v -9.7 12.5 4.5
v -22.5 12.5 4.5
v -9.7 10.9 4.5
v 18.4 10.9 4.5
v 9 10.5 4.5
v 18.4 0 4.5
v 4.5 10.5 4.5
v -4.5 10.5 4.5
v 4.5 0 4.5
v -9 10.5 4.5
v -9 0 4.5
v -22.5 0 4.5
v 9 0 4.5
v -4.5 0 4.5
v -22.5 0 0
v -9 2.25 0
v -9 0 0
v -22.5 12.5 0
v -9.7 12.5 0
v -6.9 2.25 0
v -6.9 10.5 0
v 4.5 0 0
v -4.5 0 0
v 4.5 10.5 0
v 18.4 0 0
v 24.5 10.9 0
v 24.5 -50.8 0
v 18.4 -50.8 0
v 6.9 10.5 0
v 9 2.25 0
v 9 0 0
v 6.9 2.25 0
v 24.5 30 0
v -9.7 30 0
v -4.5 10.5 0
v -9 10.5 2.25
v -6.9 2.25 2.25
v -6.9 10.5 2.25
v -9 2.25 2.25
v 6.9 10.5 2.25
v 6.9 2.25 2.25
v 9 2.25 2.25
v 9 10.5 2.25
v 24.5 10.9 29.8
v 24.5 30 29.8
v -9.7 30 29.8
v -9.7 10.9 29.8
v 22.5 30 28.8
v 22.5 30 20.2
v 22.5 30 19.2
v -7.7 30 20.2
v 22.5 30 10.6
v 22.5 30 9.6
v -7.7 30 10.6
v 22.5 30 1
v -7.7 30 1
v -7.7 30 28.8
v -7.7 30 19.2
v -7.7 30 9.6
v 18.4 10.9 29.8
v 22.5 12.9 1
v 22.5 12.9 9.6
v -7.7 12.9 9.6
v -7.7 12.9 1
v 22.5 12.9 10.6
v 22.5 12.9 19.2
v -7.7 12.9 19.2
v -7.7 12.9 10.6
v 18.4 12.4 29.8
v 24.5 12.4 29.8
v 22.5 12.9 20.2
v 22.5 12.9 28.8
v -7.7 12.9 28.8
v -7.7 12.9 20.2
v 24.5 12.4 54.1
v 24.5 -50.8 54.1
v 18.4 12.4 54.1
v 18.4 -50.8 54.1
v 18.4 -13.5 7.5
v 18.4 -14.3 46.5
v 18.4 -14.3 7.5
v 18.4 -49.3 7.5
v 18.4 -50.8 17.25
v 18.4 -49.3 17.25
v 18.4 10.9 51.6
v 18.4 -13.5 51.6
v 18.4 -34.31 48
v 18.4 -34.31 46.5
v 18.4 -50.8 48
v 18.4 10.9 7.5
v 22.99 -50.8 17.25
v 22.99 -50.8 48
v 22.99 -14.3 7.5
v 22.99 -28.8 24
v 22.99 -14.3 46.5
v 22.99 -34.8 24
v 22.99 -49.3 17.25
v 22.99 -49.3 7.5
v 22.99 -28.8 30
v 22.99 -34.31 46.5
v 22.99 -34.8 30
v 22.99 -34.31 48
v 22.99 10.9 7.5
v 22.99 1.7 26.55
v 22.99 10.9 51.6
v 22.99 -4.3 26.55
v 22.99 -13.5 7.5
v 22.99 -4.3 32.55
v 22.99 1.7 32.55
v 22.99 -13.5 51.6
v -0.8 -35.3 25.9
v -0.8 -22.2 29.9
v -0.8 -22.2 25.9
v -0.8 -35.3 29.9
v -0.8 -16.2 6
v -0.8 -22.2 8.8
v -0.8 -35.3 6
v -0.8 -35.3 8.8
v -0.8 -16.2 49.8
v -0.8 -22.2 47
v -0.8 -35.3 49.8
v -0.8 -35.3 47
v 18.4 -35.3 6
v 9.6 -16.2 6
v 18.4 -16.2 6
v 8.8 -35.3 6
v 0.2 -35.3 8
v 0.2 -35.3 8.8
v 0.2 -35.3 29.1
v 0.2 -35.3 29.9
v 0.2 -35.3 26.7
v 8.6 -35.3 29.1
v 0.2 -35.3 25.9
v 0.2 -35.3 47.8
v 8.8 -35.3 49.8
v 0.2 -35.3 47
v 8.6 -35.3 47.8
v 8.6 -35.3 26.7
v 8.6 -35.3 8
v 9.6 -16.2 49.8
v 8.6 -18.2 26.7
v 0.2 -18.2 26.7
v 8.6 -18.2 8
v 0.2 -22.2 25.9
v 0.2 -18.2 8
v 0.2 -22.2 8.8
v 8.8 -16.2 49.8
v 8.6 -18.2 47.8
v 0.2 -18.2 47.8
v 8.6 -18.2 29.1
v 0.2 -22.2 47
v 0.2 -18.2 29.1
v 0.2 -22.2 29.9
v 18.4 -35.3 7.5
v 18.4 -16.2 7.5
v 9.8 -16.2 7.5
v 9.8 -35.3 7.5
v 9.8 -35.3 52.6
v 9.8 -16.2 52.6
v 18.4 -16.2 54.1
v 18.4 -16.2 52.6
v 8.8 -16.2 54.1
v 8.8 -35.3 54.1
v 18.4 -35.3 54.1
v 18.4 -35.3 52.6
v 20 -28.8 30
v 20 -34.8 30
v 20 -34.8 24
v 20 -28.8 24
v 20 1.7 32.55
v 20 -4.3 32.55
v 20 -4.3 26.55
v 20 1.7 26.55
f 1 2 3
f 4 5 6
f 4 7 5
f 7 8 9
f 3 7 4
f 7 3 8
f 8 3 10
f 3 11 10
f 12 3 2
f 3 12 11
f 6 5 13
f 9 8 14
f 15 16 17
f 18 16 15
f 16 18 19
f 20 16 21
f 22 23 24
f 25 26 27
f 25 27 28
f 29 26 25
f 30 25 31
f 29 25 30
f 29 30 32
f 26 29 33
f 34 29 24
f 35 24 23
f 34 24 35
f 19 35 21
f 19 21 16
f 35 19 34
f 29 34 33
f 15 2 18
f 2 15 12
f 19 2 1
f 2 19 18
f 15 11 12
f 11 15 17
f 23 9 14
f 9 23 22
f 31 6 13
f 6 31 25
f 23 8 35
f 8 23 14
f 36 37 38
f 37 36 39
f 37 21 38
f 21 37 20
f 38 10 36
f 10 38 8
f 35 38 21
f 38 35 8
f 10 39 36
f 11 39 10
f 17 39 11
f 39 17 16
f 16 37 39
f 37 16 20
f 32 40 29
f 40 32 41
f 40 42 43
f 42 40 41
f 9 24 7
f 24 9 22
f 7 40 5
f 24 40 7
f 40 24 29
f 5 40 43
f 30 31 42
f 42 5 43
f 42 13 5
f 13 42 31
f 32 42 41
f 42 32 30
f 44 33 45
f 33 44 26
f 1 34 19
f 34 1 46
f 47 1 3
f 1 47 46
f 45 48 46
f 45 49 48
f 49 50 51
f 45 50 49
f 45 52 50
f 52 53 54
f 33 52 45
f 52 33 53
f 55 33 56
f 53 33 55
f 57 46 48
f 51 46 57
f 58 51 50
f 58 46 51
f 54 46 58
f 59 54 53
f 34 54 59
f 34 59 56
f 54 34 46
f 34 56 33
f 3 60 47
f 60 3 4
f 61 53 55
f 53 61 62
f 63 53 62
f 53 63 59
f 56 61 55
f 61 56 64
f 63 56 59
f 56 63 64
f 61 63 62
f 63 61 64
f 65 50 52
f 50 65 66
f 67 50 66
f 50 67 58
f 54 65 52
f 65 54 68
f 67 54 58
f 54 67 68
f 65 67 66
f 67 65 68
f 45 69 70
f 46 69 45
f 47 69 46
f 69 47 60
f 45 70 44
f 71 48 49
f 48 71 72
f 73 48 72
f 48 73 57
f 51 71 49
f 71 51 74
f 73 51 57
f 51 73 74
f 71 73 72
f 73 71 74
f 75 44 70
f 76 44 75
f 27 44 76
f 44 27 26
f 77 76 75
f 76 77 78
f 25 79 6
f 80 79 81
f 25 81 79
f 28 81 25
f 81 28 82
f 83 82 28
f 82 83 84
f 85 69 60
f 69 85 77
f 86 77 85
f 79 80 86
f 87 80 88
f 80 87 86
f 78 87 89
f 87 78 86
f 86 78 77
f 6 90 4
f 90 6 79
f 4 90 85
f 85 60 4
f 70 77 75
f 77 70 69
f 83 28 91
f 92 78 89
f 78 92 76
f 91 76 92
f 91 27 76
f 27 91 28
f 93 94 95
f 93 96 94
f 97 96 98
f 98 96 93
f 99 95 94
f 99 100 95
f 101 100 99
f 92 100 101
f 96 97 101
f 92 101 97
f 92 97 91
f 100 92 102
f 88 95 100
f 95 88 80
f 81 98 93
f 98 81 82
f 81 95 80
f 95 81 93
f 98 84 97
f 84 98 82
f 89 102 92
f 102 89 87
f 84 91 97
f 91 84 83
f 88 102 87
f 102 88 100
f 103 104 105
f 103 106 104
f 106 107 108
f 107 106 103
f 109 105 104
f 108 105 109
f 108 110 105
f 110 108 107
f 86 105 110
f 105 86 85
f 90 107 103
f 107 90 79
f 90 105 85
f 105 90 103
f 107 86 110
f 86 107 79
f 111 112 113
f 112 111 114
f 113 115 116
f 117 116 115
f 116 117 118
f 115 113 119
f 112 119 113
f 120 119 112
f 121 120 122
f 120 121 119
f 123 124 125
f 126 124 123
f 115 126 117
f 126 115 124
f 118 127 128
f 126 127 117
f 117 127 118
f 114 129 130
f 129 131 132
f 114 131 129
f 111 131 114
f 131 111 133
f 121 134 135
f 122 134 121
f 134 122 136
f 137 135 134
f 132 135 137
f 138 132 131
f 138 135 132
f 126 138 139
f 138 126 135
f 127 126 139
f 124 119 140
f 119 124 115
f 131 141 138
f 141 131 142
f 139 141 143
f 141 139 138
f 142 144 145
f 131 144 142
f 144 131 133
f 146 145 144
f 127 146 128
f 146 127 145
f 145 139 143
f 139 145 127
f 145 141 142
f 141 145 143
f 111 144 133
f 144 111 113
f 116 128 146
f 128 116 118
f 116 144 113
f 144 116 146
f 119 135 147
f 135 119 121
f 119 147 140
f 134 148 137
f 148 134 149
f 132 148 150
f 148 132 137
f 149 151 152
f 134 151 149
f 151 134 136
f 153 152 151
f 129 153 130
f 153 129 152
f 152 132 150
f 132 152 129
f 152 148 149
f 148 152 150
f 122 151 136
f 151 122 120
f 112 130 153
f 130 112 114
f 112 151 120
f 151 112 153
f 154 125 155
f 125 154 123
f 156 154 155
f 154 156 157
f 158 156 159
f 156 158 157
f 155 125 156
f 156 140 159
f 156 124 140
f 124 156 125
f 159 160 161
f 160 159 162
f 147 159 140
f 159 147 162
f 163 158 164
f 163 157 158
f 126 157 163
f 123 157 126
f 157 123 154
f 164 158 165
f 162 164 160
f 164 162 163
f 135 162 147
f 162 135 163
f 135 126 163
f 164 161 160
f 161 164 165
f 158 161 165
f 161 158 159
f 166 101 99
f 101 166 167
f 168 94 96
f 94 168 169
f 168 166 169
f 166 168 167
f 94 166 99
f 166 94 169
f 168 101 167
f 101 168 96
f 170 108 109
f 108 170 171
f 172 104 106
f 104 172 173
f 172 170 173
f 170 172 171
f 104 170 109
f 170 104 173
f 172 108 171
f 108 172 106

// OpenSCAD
// file: pcb-model-sizes.scad
pcbSmtLvSize=[65.94, 33.75];
pcbDevkitcRelaySize=[57.53, 31.88];
pcbCurrentSensorSize=[43.5, 35];
pcbCurrentSensorMiniSize=[39, 35];
pcbCurrentSensorMiniPadDepth=15;
pcbContactorPsuSize=[44.1, 24.4];
pcbContactorInterfaceRelaySize=[41.3,34.8];

pcbRelayHeight = 18.5;
pcbTallCompoent = 15;
pcbShortComponent = 6;

pcbThickness = 1.6;
solderThickness = 3;
wallThickness = 1.5;
partitionThickness = 0.8;

caseMargin = 0.2;
// file: relay-current-enclosure.scad
include <pcb-model-sizes.scad>

currentTopStands=[6, 28];
currentBottomStands = [7, 27];
relayTopStands=[9, 42];
relayBottomStands = [12, 41];
standSize = 2;

module relayCurrentCase(legHeight=5) {
    maxY = max(pcbCurrentSensorSize[1], pcbDevkitcRelaySize[1]);
    sizeX = 2 * wallThickness + partitionThickness + pcbDevkitcRelaySize[0] + pcbCurrentSensorSize[0];
    relayYOffset = (maxY - pcbDevkitcRelaySize[1]) / 2;
    difference() {
        cube([sizeX, 2 * wallThickness + maxY, wallThickness + pcbThickness + solderThickness]);
        translate([wallThickness - caseMargin, wallThickness + relayYOffset - caseMargin, wallThickness]) {
            cube([pcbDevkitcRelaySize[0] + 2 * caseMargin, pcbDevkitcRelaySize[1] + 2 * caseMargin, pcbThickness + solderThickness + 0.01]);
        }
        translate([wallThickness + pcbDevkitcRelaySize[0] + partitionThickness, wallThickness + (maxY - pcbCurrentSensorSize[1]) / 2, wallThickness]) {
            cube([pcbCurrentSensorSize[0], pcbCurrentSensorSize[1], pcbThickness + solderThickness + 0.01]);
        }
    }
    translate([wallThickness,wallThickness + relayYOffset,wallThickness]) {
        for(stand = relayBottomStands) {
            translate([stand, 0, 0]){
               cube([standSize, standSize, solderThickness]);
            }
        }
    }

    translate([wallThickness,wallThickness + relayYOffset + pcbDevkitcRelaySize[1] - standSize,wallThickness]) {
        for(stand = relayTopStands) {
            translate([stand, 0, 0]){
               cube([standSize, standSize, solderThickness]);
            }
        }
    }

    translate([wallThickness + pcbDevkitcRelaySize[0] + partitionThickness,wallThickness,wallThickness]) {
        for(stand = currentBottomStands) {
            translate([stand, 0, 0]){
               cube([standSize, standSize, solderThickness]);
            }
        }
    }

    translate([wallThickness + pcbDevkitcRelaySize[0] + partitionThickness,wallThickness + pcbCurrentSensorSize[1] - standSize,wallThickness]) {
        for(stand = currentTopStands) {
            translate([stand, 0, 0]){
               cube([standSize, standSize, solderThickness]);
            }
        }
    }

    translate([0, 0, wallThickness + pcbThickness + solderThickness - 0.01]) {
        translate([wallThickness + caseMargin, 0, 0]) {
            cube([1 * wallThickness, wallThickness, 2 * wallThickness]);
        }

        translate([sizeX - wallThickness - caseMargin - 1 * wallThickness, 0, 0]) {
            cube([1 * wallThickness, wallThickness, 2 * wallThickness]);
        }

        translate([wallThickness + caseMargin, maxY + wallThickness, 0]) {
            cube([2 * wallThickness, wallThickness, 2 * wallThickness]);
        }

        translate([sizeX - wallThickness - caseMargin - 2 * wallThickness, maxY + wallThickness, 0]) {
            cube([2 * wallThickness, wallThickness, 2 * wallThickness]);
        }
    }

    if (legHeight > 0) {
        translate([0,0,-legHeight + 0.01]) {
            cube([10 * wallThickness, 2 * wallThickness + maxY, legHeight]);
        }
        translate([sizeX - 10 * wallThickness, 0, -legHeight + 0.01]) {
            cube([10 * wallThickness, 2 * wallThickness + maxY, legHeight]);
        }
    }
}

module relayCurrentCaseTop() {
    maxY = max(pcbCurrentSensorSize[1], pcbDevkitcRelaySize[1]);
    trayHeight = wallThickness + pcbThickness + solderThickness;

    difference() {
        cube([2 * wallThickness + partitionThickness + pcbDevkitcRelaySize[0] + pcbCurrentSensorSize[0], 4 * wallThickness + maxY, wallThickness + pcbThickness + solderThickness + pcbRelayHeight + wallThickness]);
        translate([-0.01, wallThickness - caseMargin, -0.01]) {
            cube([2 * wallThickness + partitionThickness + pcbDevkitcRelaySize[0] + pcbCurrentSensorSize[0] + 0.02, 2 * wallThickness + maxY + 2 * caseMargin, wallThickness + pcbThickness + solderThickness]);
        }
        translate([wallThickness -0.01, wallThickness, wallThickness + pcbThickness + solderThickness - 0.01]) {
            cube([partitionThickness + pcbDevkitcRelaySize[0] + pcbCurrentSensorSize[0] + 0.02, 2 * wallThickness + maxY, pcbRelayHeight + 0.01]);
        }
        for(hole=[[6,6], [33, 6], [51, 6], [pcbDevkitcRelaySize[0] + partitionThickness + 15.5, 6], [pcbDevkitcRelaySize[0] + partitionThickness + 39, 6]]) {
            translate([wallThickness + hole[0] - hole[1] / 2, - 0.01, 0]) {
                cube([hole[1], wallThickness + 0.02, trayHeight + hole[1]]);
            }
        }
        for(hole=[[16,6], [46, 4], [pcbDevkitcRelaySize[0] + partitionThickness + 28.5, 6]]) {
            translate([wallThickness + hole[0] - hole[1] / 2, 3 * wallThickness + maxY - 0.01, 0]) {
                cube([hole[1], wallThickness + 0.02, trayHeight + hole[1]]);
            }
        }
    }
}

module smtLvSled() {
    maxY = max(pcbCurrentSensorSize[1], pcbDevkitcRelaySize[1]);

    offsetY = maxY + (2 * wallThickness) - (pcbSmtLvSize[1] + 2 * wallThickness);

    difference() {
        union() {
            translate([0, 0, 0]) {
                cube([pcbSmtLvSize[0] + 2 * wallThickness, pcbSmtLvSize[1] + 2 * wallThickness, wallThickness + pcbTallCompoent + pcbThickness]);
            }
        }
        translate([wallThickness, 1 * wallThickness, wallThickness]) {
            cube([pcbSmtLvSize[0], pcbSmtLvSize[1] + 0 * wallThickness + 0.01, pcbTallCompoent + pcbThickness + 0.01]);
        }

        translate([wallThickness, wallThickness, pcbTallCompoent / 2]) {
            cube([pcbSmtLvSize[0], pcbSmtLvSize[1] + wallThickness + 0.01, pcbTallCompoent / 2 + pcbThickness + wallThickness + 0.01]);
        }
    }
    translate([pcbSmtLvSize[0] / 4 - wallThickness, wallThickness, wallThickness]) {
        cube([wallThickness * 2, wallThickness * 3, pcbTallCompoent]);
    }
    translate([ 3 * pcbSmtLvSize[0] / 4 - wallThickness, wallThickness, wallThickness]) {
        cube([wallThickness * 2, wallThickness * 3, pcbTallCompoent]);
    }

    translate([pcbSmtLvSize[0] / 4 - wallThickness, wallThickness, wallThickness]) {
        cube([wallThickness * 2, wallThickness * 3, pcbTallCompoent]);
    }
    translate([ 3 * pcbSmtLvSize[0] / 4 - wallThickness, wallThickness, wallThickness]) {
        cube([wallThickness * 2, wallThickness * 3, pcbTallCompoent]);
    }

    translate([pcbSmtLvSize[0] / 4 - wallThickness, wallThickness + pcbSmtLvSize[1] - wallThickness * 1, wallThickness]) {
        #cube([wallThickness * 2, wallThickness * 2, pcbTallCompoent]);
    }

    translate([3 * pcbSmtLvSize[0] / 4 - wallThickness, wallThickness + pcbSmtLvSize[1] - wallThickness * 1, wallThickness]) {
        #cube([wallThickness * 2, wallThickness * 2, pcbTallCompoent]);
    }

    translate([0, -offsetY - 1.4, 0]) {
        cube([pcbSmtLvSize[0] + 2 * wallThickness, maxY + 4 * wallThickness + 2.8, wallThickness]);
    }

    translate([0, -offsetY - 1.4 - wallThickness, -3 * wallThickness]) {
        cube([pcbSmtLvSize[0] + 2 * wallThickness, wallThickness, 4 * wallThickness]);
    }

    translate([0, maxY + 3 * wallThickness + 1.4, -3 * wallThickness]) {
        cube([pcbSmtLvSize[0] + 2 * wallThickness, wallThickness, 4 * wallThickness]);
    }

}

relayCurrentCase();


translate([0, -wallThickness, wallThickness + pcbThickness + solderThickness + 2]) {
    relayCurrentCaseTop();
}

translate([0, 0, 15 + pcbRelayHeight + wallThickness]) {
    *smtLvSled();
}
// file: pcb-models.scad
module pcbDevkitcRelay() {
    rotate([-90, 0, 0]) {
        scale(1000) {
            import("pcb-models/access-control-devkitc-relay.stl");
        }
    }
}

module pcbDevkitcPsu() {
    rotate([-90, 0, 0]) {
        scale(1000) {
            import("pcb-models/access-control-devkitc-relay.stl");
        }
    }
}

module pcbCurrentSensor() {
    rotate([-90, 0, 0]) {
        scale(1000) {
            import("pcb-models/current-sensor-pcb.stl");
        }
    }
}

module pcbSmtLv() {
    rotate([-90, 0, 0]) {
        scale(1000) {
            import("pcb-models/access-control-smt-lv.stl");
        }
    }
}

module pcbContactorPsu() {
    rotate([-90, 0, 0]) {
        scale(1) {
            import("pcb-models/contactor-psu.stl");
        }
    }
}
// main file
fullContactorWidth=45; /*45.3*/
centerWingWidth=18;
centerInnerWingWidth=14;
centerInnerGap=9; /*8.9*/
centerOuterGap=22;
centerToPortEdge = centerOuterGap;
centerWingWall=2.25;
centerWingDepth=10.5;
centerWingSlotDepth=7;
centerToFarEdge = 19;
slotGap = 0.15;
pcbWidth=50;
pcbLength=66;
zeroOffsetToContactorCenter=-5;
pcbWallWidth=2;
pcbClearance=0.5;
pcbClearanceTop=1;
sideWidth = (fullContactorWidth - centerOuterGap) / 2 - centerWingWall;
gapWidth = fullContactorWidth / 2 - sideWidth;
verticalSupportWidth = 20;

wago221s415 = [30.2, 18.6 - 1.5, 8.6];
wago221s413 = [18.7, 18.6 - 1.5, 8.4];
wagoWallWidthH = 1;
wagoWallWidthV = 2;
wagoWireD = 6;
wagoLeaverOffset = 4;
wagoInterallWall = 0.8;

jstWireThickness = 2;
psuHeight = 3 * wagoWallWidthH + 3 * wago221s415[2];/*22.5*/

use <pcb-models.scad>
use <relay-current-enclosure.scad>
include <pcb-model-sizes.scad>

module contactorInterfaceSMT615() {

    difference() {
        translate([-fullContactorWidth / 2, 0, 0]) {
            union() {
                sideWidth = (fullContactorWidth - centerOuterGap) / 2 - centerWingWall;
                cube([fullContactorWidth, centerToFarEdge / 2 + 3, 2 * centerWingWall]);
            }
        }
        translate([-centerInnerGap / 2 - centerWingWall - slotGap, 0, 0]) {
            cube([centerWingWall + slotGap, centerWingDepth, centerWingWall]);
        }

        translate([-centerInnerGap / 2 - 2 * centerWingWall, 0, 0]) {
            cube([centerWingWall, centerWingWall, centerWingWall]);
        }

        translate([centerInnerGap / 2, 0, 0]) {
            cube([centerWingWall + slotGap, centerWingDepth, centerWingWall]);
        }

        translate([centerInnerGap / 2 + 1 * centerWingWall, 0, 0]) {
            cube([centerWingWall, centerWingWall, centerWingWall]);
        }

        translate([-centerInnerGap / 2 - (centerWingWall * 2), 0, centerWingWall]) {
            cube([2 * centerWingWall, centerWingDepth, centerWingWall]);
        }

        translate([centerInnerGap / 2 - (centerWingWall * 0), 0, centerWingWall]) {
            cube([2 * centerWingWall, centerWingDepth, centerWingWall]);
        }
    }

    halfWidthNotWago = (pcbWidth - wago221s415[0] - 2 * wagoWallWidthV)/2;

    translate([fullContactorWidth / 2 + pcbWallWidth - (wago221s415[0] + 2 * wagoWallWidthV), pcbLength / 2 + zeroOffsetToContactorCenter - (wago221s415[1] + wagoWallWidthV) + pcbWallWidth, /*centerWingWall * 2 + pcbClearance*/]){
        wagoPort415();
        translate([0, 0, wagoWallWidthH + wago221s415[2]]) {
            wagoPort415();
        }
        translate([0, 0, 2 * wagoWallWidthH + 2 * wago221s415[2]]) {
            wagoPort415();
        }
    }

    translate([fullContactorWidth / 2 + pcbWallWidth - pcbThickness - solderThickness - wallThickness , zeroOffsetToContactorCenter + pcbLength / 2 + 1 * pcbWallWidth - wago221s415[1] - 3 * wagoWallWidthH - pcbCurrentSensorMiniSize[1] - pcbContactorPsuSize[1] - 2 * wallThickness - partitionThickness + 2.5, 0]) {
        maxOuterSize = 2 * wallThickness + max(pcbCurrentSensorMiniSize[0], pcbContactorPsuSize[0]) + centerWingWall * 2 + 1 * pcbClearance + wagoWallWidthV;
        difference() {
            cube([pcbThickness + solderThickness + wallThickness, pcbCurrentSensorMiniSize[1] + pcbContactorPsuSize[1] + 2 * wallThickness + partitionThickness + 0, maxOuterSize]);
            translate([-0.01, wallThickness, centerWingWall * 2 + 1 * pcbClearance + 0.5 + wagoWallWidthV]) {
                cube([pcbThickness + solderThickness, pcbCurrentSensorMiniSize[1], pcbCurrentSensorMiniSize[0]]);
            }
            
            translate([-0.01, -0.01, centerWingWall * 2 + 1 * pcbClearance + 0.5 + wagoWallWidthV + pcbCurrentSensorMiniSize[0] / 4]) {
                cube([pcbThickness + solderThickness, wallThickness + pcbCurrentSensorMiniPadDepth, pcbCurrentSensorMiniSize[0] * 3 / 4 + wallThickness]);
            }

            translate([-0.01, wallThickness + pcbCurrentSensorMiniSize[1] + partitionThickness,centerWingWall * 2 + 1 * pcbClearance + 0.5 + wagoWallWidthV]) {
                cube([pcbThickness + solderThickness, pcbContactorPsuSize[1], pcbContactorPsuSize[0]]);
            }
        }
        
        translate([pcbThickness, wallThickness + pcbCurrentSensorMiniSize[1] / 2 - 2 * wallThickness, centerWingWall * 2 + 1 * pcbClearance + 0.5 + wagoWallWidthV + pcbCurrentSensorMiniSize[0] / 2 - 2 * wallThickness]) {
            cube([solderThickness, 4 * wallThickness, 4 * wallThickness]);
        }

        translate([pcbThickness, wallThickness + pcbCurrentSensorMiniSize[1] + partitionThickness + pcbContactorPsuSize[1] / 2 - 2 * wallThickness, centerWingWall * 2 + 1 * pcbClearance + 0.5 + wagoWallWidthV + pcbContactorPsuSize[0] / 2 - 2 * wallThickness]) {
            cube([solderThickness, 4 * wallThickness, 4 * wallThickness]);
        }

        translate([-wago221s415[2] - 2 * wagoWallWidthH - wago221s415[2], wago221s415[1] + 3 * wagoWireD + wallThickness - jstWireThickness , 2 * centerWingWall + wagoWallWidthH + 0.5]) {

            rotate([180, -90, 0]) { 
                wagoPort413(true);
            }

            translate([0,0, wago221s413[1] + 2 * wagoWallWidthV]) {
                rotate([180, -90, 0]) { 
                    #wagoPort413(true);
                }
            }

            translate([wago221s415[2] + 2 * wagoWallWidthH, -wago221s415[1] - wagoWallWidthV, 0]) {
                cube([wago221s415[2], wago221s415[1] + wagoWallWidthV, wallThickness]);

                translate([-wagoWallWidthH, 0, 0]) {
                    cube([wagoWallWidthH, wago221s415[1] + wagoWallWidthV, maxOuterSize - (2 * centerWingWall + wagoWallWidthH) - 0.5]);
                }

                translate([0, 0, (maxOuterSize - (2 * centerWingWall + wagoWallWidthH)) - wagoWallWidthV]) {
                    cube([wago221s415[2], wago221s415[1] + wagoWallWidthV, wallThickness]);
                }
            }
        }

    }


    *translate([fullContactorWidth / 2 - solderThickness,-14,pcbCurrentSensorMiniSize[0] + centerWingWall * 2 + 2 * pcbClearance + wagoWallWidthV]) {
        rotate([90, 0, 0]) {
            rotate([0,-90, 0]) {
                color("green") pcbCurrentSensor();
            }
        }
    }

    *translate([fullContactorWidth / 2 - solderThickness,11, centerWingWall * 2 + 2 * pcbClearance + wagoWallWidthV]) {
        psuVertical();
    }
}

module psuVertical() {
    translate([-1.0,7.5,0]) {
        rotate([0, 0, 0]) {
            rotate([0,-90, 0]) {
                color("green") pcbContactorPsu();
            }
        }
    }
}


module wagoPort415() {  
    difference(){
        cube([wago221s415[0] + 2 * wagoWallWidthV, wago221s415[1] + wagoWallWidthV, wago221s415[2] + 2 * wagoWallWidthH]);
        translate([wagoWallWidthV, wagoWallWidthV, wagoWallWidthH]) {
            cube([wago221s415[0], wago221s415[1] + 0.01, wago221s415[2]]);
        }
    }
}

module wagoPort413(open=false) {  
    difference(){
        cube([wago221s413[0] + 2 * wagoWallWidthV, wago221s413[1] + wagoWallWidthV, wago221s413[2] + 2 * wagoWallWidthH]);
        translate([wagoWallWidthV, wagoWallWidthV, wagoWallWidthH]) {
            cube([wago221s413[0], wago221s413[1] + 0.01, wago221s413[2]]);
        }

        if (open) {
            translate([wagoWallWidthV + wagoInterallWall,wagoWallWidthV + wagoLeaverOffset,-0.01]) {
                cube([wago221s413[0] - 2 * wagoInterallWall, wago221s413[1] - wagoLeaverOffset + 0.01, wagoWallWidthH + 0.02]);
            }
        }
    }
}

module maxWidthPort() {
    difference() {
        cube([pcbWallWidth * 2 + pcbWidth, wago221s415[1] + pcbWallWidth, wago221s415[2] + 2 * pcbWallWidth]);
        translate([pcbWallWidth, -0.01, pcbWallWidth]) {
            cube([pcbWidth, wago221s415[1] + 0.01, wago221s415[2]]);
        }
    }
}


contactorInterfaceSMT615();
